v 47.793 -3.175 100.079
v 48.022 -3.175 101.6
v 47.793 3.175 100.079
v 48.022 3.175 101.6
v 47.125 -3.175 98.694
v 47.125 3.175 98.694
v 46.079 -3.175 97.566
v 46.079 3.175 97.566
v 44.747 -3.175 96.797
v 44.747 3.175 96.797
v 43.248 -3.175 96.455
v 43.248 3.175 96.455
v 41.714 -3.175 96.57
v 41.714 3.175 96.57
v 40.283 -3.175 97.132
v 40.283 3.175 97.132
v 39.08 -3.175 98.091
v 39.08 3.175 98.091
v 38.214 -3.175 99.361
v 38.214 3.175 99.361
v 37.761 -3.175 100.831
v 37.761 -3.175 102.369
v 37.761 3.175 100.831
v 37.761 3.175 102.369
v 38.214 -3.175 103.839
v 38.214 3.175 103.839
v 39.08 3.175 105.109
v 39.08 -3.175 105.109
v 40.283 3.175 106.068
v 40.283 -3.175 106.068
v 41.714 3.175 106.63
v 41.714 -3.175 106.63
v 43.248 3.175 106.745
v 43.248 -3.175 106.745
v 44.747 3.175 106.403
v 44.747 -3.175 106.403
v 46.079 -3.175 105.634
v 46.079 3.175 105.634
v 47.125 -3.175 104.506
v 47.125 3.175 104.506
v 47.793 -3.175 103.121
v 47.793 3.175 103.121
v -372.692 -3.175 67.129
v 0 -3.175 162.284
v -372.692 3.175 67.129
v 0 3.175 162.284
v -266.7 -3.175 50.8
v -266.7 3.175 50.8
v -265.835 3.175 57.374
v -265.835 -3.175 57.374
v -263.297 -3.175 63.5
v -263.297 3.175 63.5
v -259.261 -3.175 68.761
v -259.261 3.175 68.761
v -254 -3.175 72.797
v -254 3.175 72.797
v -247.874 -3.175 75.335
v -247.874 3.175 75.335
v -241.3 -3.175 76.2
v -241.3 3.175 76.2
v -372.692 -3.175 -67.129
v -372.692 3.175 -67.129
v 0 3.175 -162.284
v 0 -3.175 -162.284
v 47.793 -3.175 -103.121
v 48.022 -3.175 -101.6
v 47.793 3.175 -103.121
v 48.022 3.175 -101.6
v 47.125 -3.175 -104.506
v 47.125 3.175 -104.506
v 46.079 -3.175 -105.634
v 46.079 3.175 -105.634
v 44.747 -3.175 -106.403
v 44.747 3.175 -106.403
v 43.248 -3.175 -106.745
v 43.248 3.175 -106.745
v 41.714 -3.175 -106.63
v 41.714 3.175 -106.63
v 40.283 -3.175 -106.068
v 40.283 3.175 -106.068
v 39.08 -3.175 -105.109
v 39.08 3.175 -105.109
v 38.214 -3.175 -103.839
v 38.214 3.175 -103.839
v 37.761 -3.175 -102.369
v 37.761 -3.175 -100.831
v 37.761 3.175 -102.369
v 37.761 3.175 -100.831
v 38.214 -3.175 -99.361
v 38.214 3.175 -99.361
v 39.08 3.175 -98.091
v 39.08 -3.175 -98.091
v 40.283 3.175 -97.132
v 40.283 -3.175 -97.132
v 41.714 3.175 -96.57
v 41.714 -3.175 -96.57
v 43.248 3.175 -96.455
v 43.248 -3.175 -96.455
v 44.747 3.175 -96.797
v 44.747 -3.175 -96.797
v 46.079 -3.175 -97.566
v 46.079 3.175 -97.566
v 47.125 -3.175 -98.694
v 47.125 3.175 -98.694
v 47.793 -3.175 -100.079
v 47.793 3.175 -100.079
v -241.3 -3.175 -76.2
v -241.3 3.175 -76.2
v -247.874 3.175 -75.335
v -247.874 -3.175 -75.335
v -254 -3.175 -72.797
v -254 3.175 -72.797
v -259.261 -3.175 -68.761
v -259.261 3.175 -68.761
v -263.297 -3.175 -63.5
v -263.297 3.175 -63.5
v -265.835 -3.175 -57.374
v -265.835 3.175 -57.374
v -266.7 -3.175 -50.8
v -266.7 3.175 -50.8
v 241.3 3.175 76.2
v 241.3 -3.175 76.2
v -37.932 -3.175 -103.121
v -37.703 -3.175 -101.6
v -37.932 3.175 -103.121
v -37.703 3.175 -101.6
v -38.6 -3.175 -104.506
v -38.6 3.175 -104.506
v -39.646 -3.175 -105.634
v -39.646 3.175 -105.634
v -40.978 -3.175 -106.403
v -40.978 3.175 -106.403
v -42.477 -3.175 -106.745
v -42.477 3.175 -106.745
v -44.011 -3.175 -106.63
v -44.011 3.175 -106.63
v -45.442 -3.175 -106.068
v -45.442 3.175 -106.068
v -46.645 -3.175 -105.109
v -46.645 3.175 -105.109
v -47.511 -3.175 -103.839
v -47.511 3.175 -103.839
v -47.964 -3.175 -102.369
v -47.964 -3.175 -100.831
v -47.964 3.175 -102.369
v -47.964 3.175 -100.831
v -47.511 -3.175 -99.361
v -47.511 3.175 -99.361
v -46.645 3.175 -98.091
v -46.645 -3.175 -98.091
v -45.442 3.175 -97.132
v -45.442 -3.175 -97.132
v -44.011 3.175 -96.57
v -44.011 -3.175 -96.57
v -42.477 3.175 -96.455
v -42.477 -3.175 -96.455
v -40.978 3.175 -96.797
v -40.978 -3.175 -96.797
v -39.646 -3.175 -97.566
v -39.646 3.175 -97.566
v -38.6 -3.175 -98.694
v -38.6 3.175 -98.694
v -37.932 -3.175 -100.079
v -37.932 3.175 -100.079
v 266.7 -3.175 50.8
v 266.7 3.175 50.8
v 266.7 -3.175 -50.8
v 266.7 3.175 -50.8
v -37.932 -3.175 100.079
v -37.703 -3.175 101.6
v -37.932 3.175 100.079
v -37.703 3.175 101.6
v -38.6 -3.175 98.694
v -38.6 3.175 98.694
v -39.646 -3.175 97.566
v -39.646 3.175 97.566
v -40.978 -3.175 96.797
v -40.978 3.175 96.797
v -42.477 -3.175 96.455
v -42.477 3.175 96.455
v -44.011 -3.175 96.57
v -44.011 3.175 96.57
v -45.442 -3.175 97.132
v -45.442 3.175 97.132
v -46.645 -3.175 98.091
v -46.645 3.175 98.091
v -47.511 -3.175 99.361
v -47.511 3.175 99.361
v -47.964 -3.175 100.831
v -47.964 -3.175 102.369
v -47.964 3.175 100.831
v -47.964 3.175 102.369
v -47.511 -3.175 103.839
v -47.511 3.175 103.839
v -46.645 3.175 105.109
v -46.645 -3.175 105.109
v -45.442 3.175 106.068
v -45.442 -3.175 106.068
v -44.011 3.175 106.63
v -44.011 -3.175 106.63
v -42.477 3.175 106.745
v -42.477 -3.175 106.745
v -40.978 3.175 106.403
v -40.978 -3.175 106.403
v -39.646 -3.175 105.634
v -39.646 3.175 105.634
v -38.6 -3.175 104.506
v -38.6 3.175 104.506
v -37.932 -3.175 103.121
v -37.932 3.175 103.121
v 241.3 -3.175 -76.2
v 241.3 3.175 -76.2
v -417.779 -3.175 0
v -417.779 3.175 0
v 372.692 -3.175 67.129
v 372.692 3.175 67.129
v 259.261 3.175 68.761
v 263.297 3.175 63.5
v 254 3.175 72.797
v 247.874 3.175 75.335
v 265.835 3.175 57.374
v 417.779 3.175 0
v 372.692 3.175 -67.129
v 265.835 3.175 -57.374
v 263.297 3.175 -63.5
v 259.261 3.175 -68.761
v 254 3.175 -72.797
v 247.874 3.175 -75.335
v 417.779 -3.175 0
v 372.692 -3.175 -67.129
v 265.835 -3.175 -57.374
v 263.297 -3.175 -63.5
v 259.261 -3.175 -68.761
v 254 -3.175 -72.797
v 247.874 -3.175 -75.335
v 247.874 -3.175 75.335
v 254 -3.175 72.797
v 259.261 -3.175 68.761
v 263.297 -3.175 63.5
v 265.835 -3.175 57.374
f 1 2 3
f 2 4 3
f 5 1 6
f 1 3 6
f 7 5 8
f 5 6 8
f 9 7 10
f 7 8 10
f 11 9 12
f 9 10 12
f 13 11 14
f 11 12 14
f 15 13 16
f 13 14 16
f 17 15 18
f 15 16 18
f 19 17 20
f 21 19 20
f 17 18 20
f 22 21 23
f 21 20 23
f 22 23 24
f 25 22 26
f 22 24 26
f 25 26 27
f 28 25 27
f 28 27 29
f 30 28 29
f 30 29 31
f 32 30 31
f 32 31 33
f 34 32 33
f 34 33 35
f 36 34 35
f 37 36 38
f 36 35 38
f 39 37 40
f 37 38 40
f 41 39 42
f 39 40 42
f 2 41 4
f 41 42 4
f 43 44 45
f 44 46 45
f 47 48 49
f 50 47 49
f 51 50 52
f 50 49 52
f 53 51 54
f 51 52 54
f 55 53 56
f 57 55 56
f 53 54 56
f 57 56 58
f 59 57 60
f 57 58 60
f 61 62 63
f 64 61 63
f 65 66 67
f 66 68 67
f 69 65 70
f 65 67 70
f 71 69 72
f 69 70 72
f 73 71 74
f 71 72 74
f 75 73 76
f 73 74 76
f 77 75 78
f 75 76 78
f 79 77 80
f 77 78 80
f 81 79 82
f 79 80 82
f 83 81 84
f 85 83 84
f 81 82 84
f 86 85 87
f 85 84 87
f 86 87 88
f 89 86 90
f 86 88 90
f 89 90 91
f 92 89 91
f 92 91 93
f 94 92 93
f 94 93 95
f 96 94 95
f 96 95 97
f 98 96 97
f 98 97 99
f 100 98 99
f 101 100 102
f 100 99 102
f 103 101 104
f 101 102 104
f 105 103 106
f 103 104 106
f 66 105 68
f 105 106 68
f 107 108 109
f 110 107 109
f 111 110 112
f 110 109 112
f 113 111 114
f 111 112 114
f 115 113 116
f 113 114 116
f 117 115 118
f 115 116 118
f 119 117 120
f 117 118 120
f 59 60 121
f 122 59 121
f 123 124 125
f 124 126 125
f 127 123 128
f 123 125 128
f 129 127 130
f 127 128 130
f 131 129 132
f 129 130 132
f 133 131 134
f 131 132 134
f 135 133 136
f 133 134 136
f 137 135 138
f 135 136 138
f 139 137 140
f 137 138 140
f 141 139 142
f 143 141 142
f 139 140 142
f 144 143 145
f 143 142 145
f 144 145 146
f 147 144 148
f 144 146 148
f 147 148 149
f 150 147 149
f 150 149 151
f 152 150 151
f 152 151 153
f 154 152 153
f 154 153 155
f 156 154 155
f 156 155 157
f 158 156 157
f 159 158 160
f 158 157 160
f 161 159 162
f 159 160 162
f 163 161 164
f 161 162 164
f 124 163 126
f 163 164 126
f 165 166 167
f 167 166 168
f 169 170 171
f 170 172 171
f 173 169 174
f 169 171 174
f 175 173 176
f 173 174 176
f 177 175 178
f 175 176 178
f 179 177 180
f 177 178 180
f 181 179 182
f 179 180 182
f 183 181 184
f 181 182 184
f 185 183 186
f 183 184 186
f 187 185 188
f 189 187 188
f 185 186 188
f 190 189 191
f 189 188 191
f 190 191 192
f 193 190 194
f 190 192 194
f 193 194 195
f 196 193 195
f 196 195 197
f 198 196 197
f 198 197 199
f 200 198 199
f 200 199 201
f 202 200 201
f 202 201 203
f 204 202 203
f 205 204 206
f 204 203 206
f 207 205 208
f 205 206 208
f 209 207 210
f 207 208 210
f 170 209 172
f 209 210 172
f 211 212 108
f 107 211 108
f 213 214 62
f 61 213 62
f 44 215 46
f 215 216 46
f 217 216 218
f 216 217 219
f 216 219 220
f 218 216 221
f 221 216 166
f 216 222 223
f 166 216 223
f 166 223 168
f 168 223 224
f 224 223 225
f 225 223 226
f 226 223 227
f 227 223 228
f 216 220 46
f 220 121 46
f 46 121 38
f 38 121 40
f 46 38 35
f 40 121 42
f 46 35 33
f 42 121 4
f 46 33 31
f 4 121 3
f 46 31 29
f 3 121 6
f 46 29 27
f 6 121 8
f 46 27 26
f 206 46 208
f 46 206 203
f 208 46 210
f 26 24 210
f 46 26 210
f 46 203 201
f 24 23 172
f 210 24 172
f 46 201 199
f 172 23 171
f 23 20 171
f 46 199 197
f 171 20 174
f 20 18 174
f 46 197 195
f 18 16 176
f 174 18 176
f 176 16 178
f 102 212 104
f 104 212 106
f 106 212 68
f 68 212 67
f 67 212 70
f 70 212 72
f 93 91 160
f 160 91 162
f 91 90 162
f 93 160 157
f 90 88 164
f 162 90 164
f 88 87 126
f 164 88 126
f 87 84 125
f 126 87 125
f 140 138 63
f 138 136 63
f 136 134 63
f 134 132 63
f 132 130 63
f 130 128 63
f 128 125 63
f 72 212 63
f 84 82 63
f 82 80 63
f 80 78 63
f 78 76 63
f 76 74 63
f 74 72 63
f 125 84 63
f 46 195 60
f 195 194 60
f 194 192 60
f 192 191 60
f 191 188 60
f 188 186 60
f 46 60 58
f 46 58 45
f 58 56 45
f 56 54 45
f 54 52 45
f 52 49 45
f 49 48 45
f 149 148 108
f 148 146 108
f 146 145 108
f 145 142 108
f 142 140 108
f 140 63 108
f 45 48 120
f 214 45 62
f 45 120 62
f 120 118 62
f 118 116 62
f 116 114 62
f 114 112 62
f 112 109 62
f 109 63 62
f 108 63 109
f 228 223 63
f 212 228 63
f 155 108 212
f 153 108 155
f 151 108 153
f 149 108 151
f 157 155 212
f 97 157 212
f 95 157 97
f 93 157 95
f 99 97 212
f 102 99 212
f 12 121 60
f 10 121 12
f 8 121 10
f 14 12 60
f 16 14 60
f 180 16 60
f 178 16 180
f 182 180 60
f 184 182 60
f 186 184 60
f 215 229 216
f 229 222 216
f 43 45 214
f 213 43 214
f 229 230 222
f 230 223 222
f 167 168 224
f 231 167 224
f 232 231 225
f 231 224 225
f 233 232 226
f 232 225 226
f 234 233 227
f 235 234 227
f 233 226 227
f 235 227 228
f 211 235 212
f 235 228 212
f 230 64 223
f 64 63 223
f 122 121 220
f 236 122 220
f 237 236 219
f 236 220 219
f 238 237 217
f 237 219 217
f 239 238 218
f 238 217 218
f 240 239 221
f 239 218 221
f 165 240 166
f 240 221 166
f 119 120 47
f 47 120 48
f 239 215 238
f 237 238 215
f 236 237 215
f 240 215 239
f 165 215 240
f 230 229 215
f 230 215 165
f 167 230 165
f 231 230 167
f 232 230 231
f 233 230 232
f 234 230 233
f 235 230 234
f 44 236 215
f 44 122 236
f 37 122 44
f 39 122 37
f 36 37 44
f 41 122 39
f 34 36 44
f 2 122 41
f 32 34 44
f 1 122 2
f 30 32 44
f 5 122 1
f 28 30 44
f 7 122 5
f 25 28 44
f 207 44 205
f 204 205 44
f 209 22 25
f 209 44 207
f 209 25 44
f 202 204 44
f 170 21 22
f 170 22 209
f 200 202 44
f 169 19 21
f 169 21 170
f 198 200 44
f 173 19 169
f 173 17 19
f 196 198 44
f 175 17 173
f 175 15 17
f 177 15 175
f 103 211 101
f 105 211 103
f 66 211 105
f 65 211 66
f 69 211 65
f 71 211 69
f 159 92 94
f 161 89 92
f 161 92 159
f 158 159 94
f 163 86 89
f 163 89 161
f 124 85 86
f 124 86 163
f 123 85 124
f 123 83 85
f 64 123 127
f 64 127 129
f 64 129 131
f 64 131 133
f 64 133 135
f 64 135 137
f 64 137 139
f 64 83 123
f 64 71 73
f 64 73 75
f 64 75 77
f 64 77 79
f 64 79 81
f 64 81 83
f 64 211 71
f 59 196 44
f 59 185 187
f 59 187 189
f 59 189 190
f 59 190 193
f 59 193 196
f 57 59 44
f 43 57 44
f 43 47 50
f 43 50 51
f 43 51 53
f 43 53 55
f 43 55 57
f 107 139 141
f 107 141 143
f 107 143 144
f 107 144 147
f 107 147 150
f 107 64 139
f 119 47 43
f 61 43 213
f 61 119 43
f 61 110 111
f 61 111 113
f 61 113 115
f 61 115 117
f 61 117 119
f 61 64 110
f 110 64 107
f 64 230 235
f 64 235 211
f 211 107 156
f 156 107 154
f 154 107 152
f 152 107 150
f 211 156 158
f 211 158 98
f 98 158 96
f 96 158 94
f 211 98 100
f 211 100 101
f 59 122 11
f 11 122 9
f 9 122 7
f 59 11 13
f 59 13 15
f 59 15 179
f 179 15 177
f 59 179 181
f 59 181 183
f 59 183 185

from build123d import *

# Parameters (mm, degrees)
BOSS_EXTRUDE1_DEPTH     = 3.175
SKETCH2_R               = 5.159375
CUT_EXTRUDE1_DEPTH      = 4.175
CUT_EXTRUDE1_DEPTH_BACK = 4.175


with BuildPart() as part:
    # Sketch1 → Boss-Extrude1 (new body, symmetric)
    with BuildSketch(Plane(origin=(0, 0, 0), x_dir=(1, 0, 0), z_dir=(0, 1, 0))):
        Polygon((-372.691935385, 67.129264749), (0, 162.283527596), (372.691935385, 67.129264749), (417.779308923, 0), (372.691935385, -67.129264749), (0, -162.283527596), (-372.691935385, -67.129264749), (-417.779308923, 0), align=None)
    extrude(amount=BOSS_EXTRUDE1_DEPTH, both=True)

    # Sketch2 → Cut-Extrude1 (cut, two sides)
    with BuildSketch(Plane(origin=(0, 0, 0), x_dir=(1, 0, 0), z_dir=(0, 1, 0))) as cut_extrude1_sk:
        with Locations((42.8625, 101.6)):
            Circle(SKETCH2_R)
        with Locations((-42.8625, 101.6)):
            Circle(SKETCH2_R)
        with Locations((-42.8625, -101.6)):
            Circle(SKETCH2_R)
        with Locations((42.8625, -101.6)):
            Circle(SKETCH2_R)
        with BuildLine():
            Line((241.3, 76.2), (-241.3, 76.2))
            ThreePointArc((-241.3, 76.2), (-259.260512242, 68.760512242), (-266.7, 50.8))
            Line((-266.7, 50.8), (-266.7, -50.8))
            ThreePointArc((-266.7, -50.8), (-259.260512242, -68.760512242), (-241.3, -76.2))
            Line((-241.3, -76.2), (241.3, -76.2))
            ThreePointArc((241.3, -76.2), (259.260512242, -68.760512242), (266.7, -50.8))
            Line((266.7, -50.8), (266.7, 50.8))
            ThreePointArc((266.7, 50.8), (259.260512242, 68.760512242), (241.3, 76.2))
        make_face()
    extrude(amount=CUT_EXTRUDE1_DEPTH, mode=Mode.SUBTRACT)
    extrude(cut_extrude1_sk.sketch, amount=-CUT_EXTRUDE1_DEPTH_BACK, mode=Mode.SUBTRACT)


solid = part.part
